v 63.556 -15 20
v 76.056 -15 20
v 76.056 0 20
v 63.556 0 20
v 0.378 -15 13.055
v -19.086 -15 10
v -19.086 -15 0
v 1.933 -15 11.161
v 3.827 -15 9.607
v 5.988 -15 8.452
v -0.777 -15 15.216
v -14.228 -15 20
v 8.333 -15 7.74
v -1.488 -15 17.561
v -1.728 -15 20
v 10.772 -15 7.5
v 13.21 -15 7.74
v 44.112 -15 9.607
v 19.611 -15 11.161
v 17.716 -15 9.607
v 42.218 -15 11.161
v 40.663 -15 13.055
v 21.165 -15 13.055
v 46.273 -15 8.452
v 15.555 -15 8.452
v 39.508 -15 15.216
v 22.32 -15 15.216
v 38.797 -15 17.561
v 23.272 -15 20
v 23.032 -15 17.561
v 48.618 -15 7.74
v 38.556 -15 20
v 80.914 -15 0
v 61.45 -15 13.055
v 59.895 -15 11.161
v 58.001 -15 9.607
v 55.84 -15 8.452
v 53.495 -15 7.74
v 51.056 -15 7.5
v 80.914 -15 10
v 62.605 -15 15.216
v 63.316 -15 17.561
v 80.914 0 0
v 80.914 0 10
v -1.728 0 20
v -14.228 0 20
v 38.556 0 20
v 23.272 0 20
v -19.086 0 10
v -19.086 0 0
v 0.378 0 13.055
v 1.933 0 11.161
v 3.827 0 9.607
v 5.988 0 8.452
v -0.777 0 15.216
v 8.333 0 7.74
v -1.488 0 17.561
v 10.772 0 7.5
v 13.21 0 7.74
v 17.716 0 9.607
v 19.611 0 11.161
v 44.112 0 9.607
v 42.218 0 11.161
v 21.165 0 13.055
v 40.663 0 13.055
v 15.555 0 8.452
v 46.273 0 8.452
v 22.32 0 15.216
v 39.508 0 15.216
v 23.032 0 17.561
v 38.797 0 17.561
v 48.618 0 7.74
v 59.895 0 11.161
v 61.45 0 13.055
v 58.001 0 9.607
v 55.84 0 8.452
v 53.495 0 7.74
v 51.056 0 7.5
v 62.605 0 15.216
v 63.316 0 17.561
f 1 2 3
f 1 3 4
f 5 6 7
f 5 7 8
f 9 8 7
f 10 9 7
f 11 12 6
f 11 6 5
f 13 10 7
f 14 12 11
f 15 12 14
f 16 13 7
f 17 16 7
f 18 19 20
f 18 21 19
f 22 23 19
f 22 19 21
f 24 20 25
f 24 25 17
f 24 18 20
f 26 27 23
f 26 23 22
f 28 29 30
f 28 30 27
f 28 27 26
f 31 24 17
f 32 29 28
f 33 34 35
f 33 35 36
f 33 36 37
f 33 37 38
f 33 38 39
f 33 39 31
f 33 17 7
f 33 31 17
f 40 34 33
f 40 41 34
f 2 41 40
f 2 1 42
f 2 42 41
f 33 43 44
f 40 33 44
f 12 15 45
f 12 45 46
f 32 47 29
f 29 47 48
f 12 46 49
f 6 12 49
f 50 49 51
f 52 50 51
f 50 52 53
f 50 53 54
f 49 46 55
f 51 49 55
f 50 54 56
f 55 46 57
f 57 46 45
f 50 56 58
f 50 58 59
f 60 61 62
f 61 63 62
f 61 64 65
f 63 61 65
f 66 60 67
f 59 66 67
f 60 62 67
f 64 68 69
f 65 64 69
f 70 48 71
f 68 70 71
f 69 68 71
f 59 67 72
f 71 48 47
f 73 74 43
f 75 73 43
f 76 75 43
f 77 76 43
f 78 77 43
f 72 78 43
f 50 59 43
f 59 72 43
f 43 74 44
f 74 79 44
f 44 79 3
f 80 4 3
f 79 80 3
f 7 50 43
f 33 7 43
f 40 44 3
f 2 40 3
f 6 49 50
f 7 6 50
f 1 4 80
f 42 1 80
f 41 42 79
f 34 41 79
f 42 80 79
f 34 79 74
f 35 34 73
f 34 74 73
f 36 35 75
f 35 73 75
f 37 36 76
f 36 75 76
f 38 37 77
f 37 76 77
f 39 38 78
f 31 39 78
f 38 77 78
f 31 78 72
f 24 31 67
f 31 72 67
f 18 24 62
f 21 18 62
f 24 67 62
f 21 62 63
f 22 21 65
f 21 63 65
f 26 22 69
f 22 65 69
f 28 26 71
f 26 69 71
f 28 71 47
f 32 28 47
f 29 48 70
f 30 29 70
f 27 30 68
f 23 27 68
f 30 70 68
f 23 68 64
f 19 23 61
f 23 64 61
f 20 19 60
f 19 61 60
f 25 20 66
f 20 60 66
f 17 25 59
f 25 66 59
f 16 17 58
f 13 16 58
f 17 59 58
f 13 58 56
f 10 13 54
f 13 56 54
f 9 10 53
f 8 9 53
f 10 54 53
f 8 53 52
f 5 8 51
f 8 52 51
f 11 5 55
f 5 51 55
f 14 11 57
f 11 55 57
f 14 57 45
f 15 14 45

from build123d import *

# Parameters (mm, degrees)
F1_DEPTH = 15


with BuildPart() as f1:
    # F0 (on Front) → F1 (new body)
    with BuildSketch(Plane.XZ):
        with BuildLine():
            Line((-19.085956, 10), (-19.085956, 0))
            Line((-19.085956, 0), (80.914044, 0))
            Line((80.914044, 0), (80.914044, 10))
            Line((80.914044, 10), (76.056394, 20))
            Line((76.056394, 20), (63.556394, 20))
            ThreePointArc((63.556394, 20), (51.056394, 7.5), (38.556394, 20))
            Line((38.556394, 20), (23.271694, 20))
            ThreePointArc((23.271694, 20), (10.771694, 7.5), (-1.728306, 20))
            Line((-1.728306, 20), (-14.228306, 20))
            Line((-14.228306, 20), (-19.085956, 10))
        make_face()
    extrude(amount=F1_DEPTH)


solid = f1.part
